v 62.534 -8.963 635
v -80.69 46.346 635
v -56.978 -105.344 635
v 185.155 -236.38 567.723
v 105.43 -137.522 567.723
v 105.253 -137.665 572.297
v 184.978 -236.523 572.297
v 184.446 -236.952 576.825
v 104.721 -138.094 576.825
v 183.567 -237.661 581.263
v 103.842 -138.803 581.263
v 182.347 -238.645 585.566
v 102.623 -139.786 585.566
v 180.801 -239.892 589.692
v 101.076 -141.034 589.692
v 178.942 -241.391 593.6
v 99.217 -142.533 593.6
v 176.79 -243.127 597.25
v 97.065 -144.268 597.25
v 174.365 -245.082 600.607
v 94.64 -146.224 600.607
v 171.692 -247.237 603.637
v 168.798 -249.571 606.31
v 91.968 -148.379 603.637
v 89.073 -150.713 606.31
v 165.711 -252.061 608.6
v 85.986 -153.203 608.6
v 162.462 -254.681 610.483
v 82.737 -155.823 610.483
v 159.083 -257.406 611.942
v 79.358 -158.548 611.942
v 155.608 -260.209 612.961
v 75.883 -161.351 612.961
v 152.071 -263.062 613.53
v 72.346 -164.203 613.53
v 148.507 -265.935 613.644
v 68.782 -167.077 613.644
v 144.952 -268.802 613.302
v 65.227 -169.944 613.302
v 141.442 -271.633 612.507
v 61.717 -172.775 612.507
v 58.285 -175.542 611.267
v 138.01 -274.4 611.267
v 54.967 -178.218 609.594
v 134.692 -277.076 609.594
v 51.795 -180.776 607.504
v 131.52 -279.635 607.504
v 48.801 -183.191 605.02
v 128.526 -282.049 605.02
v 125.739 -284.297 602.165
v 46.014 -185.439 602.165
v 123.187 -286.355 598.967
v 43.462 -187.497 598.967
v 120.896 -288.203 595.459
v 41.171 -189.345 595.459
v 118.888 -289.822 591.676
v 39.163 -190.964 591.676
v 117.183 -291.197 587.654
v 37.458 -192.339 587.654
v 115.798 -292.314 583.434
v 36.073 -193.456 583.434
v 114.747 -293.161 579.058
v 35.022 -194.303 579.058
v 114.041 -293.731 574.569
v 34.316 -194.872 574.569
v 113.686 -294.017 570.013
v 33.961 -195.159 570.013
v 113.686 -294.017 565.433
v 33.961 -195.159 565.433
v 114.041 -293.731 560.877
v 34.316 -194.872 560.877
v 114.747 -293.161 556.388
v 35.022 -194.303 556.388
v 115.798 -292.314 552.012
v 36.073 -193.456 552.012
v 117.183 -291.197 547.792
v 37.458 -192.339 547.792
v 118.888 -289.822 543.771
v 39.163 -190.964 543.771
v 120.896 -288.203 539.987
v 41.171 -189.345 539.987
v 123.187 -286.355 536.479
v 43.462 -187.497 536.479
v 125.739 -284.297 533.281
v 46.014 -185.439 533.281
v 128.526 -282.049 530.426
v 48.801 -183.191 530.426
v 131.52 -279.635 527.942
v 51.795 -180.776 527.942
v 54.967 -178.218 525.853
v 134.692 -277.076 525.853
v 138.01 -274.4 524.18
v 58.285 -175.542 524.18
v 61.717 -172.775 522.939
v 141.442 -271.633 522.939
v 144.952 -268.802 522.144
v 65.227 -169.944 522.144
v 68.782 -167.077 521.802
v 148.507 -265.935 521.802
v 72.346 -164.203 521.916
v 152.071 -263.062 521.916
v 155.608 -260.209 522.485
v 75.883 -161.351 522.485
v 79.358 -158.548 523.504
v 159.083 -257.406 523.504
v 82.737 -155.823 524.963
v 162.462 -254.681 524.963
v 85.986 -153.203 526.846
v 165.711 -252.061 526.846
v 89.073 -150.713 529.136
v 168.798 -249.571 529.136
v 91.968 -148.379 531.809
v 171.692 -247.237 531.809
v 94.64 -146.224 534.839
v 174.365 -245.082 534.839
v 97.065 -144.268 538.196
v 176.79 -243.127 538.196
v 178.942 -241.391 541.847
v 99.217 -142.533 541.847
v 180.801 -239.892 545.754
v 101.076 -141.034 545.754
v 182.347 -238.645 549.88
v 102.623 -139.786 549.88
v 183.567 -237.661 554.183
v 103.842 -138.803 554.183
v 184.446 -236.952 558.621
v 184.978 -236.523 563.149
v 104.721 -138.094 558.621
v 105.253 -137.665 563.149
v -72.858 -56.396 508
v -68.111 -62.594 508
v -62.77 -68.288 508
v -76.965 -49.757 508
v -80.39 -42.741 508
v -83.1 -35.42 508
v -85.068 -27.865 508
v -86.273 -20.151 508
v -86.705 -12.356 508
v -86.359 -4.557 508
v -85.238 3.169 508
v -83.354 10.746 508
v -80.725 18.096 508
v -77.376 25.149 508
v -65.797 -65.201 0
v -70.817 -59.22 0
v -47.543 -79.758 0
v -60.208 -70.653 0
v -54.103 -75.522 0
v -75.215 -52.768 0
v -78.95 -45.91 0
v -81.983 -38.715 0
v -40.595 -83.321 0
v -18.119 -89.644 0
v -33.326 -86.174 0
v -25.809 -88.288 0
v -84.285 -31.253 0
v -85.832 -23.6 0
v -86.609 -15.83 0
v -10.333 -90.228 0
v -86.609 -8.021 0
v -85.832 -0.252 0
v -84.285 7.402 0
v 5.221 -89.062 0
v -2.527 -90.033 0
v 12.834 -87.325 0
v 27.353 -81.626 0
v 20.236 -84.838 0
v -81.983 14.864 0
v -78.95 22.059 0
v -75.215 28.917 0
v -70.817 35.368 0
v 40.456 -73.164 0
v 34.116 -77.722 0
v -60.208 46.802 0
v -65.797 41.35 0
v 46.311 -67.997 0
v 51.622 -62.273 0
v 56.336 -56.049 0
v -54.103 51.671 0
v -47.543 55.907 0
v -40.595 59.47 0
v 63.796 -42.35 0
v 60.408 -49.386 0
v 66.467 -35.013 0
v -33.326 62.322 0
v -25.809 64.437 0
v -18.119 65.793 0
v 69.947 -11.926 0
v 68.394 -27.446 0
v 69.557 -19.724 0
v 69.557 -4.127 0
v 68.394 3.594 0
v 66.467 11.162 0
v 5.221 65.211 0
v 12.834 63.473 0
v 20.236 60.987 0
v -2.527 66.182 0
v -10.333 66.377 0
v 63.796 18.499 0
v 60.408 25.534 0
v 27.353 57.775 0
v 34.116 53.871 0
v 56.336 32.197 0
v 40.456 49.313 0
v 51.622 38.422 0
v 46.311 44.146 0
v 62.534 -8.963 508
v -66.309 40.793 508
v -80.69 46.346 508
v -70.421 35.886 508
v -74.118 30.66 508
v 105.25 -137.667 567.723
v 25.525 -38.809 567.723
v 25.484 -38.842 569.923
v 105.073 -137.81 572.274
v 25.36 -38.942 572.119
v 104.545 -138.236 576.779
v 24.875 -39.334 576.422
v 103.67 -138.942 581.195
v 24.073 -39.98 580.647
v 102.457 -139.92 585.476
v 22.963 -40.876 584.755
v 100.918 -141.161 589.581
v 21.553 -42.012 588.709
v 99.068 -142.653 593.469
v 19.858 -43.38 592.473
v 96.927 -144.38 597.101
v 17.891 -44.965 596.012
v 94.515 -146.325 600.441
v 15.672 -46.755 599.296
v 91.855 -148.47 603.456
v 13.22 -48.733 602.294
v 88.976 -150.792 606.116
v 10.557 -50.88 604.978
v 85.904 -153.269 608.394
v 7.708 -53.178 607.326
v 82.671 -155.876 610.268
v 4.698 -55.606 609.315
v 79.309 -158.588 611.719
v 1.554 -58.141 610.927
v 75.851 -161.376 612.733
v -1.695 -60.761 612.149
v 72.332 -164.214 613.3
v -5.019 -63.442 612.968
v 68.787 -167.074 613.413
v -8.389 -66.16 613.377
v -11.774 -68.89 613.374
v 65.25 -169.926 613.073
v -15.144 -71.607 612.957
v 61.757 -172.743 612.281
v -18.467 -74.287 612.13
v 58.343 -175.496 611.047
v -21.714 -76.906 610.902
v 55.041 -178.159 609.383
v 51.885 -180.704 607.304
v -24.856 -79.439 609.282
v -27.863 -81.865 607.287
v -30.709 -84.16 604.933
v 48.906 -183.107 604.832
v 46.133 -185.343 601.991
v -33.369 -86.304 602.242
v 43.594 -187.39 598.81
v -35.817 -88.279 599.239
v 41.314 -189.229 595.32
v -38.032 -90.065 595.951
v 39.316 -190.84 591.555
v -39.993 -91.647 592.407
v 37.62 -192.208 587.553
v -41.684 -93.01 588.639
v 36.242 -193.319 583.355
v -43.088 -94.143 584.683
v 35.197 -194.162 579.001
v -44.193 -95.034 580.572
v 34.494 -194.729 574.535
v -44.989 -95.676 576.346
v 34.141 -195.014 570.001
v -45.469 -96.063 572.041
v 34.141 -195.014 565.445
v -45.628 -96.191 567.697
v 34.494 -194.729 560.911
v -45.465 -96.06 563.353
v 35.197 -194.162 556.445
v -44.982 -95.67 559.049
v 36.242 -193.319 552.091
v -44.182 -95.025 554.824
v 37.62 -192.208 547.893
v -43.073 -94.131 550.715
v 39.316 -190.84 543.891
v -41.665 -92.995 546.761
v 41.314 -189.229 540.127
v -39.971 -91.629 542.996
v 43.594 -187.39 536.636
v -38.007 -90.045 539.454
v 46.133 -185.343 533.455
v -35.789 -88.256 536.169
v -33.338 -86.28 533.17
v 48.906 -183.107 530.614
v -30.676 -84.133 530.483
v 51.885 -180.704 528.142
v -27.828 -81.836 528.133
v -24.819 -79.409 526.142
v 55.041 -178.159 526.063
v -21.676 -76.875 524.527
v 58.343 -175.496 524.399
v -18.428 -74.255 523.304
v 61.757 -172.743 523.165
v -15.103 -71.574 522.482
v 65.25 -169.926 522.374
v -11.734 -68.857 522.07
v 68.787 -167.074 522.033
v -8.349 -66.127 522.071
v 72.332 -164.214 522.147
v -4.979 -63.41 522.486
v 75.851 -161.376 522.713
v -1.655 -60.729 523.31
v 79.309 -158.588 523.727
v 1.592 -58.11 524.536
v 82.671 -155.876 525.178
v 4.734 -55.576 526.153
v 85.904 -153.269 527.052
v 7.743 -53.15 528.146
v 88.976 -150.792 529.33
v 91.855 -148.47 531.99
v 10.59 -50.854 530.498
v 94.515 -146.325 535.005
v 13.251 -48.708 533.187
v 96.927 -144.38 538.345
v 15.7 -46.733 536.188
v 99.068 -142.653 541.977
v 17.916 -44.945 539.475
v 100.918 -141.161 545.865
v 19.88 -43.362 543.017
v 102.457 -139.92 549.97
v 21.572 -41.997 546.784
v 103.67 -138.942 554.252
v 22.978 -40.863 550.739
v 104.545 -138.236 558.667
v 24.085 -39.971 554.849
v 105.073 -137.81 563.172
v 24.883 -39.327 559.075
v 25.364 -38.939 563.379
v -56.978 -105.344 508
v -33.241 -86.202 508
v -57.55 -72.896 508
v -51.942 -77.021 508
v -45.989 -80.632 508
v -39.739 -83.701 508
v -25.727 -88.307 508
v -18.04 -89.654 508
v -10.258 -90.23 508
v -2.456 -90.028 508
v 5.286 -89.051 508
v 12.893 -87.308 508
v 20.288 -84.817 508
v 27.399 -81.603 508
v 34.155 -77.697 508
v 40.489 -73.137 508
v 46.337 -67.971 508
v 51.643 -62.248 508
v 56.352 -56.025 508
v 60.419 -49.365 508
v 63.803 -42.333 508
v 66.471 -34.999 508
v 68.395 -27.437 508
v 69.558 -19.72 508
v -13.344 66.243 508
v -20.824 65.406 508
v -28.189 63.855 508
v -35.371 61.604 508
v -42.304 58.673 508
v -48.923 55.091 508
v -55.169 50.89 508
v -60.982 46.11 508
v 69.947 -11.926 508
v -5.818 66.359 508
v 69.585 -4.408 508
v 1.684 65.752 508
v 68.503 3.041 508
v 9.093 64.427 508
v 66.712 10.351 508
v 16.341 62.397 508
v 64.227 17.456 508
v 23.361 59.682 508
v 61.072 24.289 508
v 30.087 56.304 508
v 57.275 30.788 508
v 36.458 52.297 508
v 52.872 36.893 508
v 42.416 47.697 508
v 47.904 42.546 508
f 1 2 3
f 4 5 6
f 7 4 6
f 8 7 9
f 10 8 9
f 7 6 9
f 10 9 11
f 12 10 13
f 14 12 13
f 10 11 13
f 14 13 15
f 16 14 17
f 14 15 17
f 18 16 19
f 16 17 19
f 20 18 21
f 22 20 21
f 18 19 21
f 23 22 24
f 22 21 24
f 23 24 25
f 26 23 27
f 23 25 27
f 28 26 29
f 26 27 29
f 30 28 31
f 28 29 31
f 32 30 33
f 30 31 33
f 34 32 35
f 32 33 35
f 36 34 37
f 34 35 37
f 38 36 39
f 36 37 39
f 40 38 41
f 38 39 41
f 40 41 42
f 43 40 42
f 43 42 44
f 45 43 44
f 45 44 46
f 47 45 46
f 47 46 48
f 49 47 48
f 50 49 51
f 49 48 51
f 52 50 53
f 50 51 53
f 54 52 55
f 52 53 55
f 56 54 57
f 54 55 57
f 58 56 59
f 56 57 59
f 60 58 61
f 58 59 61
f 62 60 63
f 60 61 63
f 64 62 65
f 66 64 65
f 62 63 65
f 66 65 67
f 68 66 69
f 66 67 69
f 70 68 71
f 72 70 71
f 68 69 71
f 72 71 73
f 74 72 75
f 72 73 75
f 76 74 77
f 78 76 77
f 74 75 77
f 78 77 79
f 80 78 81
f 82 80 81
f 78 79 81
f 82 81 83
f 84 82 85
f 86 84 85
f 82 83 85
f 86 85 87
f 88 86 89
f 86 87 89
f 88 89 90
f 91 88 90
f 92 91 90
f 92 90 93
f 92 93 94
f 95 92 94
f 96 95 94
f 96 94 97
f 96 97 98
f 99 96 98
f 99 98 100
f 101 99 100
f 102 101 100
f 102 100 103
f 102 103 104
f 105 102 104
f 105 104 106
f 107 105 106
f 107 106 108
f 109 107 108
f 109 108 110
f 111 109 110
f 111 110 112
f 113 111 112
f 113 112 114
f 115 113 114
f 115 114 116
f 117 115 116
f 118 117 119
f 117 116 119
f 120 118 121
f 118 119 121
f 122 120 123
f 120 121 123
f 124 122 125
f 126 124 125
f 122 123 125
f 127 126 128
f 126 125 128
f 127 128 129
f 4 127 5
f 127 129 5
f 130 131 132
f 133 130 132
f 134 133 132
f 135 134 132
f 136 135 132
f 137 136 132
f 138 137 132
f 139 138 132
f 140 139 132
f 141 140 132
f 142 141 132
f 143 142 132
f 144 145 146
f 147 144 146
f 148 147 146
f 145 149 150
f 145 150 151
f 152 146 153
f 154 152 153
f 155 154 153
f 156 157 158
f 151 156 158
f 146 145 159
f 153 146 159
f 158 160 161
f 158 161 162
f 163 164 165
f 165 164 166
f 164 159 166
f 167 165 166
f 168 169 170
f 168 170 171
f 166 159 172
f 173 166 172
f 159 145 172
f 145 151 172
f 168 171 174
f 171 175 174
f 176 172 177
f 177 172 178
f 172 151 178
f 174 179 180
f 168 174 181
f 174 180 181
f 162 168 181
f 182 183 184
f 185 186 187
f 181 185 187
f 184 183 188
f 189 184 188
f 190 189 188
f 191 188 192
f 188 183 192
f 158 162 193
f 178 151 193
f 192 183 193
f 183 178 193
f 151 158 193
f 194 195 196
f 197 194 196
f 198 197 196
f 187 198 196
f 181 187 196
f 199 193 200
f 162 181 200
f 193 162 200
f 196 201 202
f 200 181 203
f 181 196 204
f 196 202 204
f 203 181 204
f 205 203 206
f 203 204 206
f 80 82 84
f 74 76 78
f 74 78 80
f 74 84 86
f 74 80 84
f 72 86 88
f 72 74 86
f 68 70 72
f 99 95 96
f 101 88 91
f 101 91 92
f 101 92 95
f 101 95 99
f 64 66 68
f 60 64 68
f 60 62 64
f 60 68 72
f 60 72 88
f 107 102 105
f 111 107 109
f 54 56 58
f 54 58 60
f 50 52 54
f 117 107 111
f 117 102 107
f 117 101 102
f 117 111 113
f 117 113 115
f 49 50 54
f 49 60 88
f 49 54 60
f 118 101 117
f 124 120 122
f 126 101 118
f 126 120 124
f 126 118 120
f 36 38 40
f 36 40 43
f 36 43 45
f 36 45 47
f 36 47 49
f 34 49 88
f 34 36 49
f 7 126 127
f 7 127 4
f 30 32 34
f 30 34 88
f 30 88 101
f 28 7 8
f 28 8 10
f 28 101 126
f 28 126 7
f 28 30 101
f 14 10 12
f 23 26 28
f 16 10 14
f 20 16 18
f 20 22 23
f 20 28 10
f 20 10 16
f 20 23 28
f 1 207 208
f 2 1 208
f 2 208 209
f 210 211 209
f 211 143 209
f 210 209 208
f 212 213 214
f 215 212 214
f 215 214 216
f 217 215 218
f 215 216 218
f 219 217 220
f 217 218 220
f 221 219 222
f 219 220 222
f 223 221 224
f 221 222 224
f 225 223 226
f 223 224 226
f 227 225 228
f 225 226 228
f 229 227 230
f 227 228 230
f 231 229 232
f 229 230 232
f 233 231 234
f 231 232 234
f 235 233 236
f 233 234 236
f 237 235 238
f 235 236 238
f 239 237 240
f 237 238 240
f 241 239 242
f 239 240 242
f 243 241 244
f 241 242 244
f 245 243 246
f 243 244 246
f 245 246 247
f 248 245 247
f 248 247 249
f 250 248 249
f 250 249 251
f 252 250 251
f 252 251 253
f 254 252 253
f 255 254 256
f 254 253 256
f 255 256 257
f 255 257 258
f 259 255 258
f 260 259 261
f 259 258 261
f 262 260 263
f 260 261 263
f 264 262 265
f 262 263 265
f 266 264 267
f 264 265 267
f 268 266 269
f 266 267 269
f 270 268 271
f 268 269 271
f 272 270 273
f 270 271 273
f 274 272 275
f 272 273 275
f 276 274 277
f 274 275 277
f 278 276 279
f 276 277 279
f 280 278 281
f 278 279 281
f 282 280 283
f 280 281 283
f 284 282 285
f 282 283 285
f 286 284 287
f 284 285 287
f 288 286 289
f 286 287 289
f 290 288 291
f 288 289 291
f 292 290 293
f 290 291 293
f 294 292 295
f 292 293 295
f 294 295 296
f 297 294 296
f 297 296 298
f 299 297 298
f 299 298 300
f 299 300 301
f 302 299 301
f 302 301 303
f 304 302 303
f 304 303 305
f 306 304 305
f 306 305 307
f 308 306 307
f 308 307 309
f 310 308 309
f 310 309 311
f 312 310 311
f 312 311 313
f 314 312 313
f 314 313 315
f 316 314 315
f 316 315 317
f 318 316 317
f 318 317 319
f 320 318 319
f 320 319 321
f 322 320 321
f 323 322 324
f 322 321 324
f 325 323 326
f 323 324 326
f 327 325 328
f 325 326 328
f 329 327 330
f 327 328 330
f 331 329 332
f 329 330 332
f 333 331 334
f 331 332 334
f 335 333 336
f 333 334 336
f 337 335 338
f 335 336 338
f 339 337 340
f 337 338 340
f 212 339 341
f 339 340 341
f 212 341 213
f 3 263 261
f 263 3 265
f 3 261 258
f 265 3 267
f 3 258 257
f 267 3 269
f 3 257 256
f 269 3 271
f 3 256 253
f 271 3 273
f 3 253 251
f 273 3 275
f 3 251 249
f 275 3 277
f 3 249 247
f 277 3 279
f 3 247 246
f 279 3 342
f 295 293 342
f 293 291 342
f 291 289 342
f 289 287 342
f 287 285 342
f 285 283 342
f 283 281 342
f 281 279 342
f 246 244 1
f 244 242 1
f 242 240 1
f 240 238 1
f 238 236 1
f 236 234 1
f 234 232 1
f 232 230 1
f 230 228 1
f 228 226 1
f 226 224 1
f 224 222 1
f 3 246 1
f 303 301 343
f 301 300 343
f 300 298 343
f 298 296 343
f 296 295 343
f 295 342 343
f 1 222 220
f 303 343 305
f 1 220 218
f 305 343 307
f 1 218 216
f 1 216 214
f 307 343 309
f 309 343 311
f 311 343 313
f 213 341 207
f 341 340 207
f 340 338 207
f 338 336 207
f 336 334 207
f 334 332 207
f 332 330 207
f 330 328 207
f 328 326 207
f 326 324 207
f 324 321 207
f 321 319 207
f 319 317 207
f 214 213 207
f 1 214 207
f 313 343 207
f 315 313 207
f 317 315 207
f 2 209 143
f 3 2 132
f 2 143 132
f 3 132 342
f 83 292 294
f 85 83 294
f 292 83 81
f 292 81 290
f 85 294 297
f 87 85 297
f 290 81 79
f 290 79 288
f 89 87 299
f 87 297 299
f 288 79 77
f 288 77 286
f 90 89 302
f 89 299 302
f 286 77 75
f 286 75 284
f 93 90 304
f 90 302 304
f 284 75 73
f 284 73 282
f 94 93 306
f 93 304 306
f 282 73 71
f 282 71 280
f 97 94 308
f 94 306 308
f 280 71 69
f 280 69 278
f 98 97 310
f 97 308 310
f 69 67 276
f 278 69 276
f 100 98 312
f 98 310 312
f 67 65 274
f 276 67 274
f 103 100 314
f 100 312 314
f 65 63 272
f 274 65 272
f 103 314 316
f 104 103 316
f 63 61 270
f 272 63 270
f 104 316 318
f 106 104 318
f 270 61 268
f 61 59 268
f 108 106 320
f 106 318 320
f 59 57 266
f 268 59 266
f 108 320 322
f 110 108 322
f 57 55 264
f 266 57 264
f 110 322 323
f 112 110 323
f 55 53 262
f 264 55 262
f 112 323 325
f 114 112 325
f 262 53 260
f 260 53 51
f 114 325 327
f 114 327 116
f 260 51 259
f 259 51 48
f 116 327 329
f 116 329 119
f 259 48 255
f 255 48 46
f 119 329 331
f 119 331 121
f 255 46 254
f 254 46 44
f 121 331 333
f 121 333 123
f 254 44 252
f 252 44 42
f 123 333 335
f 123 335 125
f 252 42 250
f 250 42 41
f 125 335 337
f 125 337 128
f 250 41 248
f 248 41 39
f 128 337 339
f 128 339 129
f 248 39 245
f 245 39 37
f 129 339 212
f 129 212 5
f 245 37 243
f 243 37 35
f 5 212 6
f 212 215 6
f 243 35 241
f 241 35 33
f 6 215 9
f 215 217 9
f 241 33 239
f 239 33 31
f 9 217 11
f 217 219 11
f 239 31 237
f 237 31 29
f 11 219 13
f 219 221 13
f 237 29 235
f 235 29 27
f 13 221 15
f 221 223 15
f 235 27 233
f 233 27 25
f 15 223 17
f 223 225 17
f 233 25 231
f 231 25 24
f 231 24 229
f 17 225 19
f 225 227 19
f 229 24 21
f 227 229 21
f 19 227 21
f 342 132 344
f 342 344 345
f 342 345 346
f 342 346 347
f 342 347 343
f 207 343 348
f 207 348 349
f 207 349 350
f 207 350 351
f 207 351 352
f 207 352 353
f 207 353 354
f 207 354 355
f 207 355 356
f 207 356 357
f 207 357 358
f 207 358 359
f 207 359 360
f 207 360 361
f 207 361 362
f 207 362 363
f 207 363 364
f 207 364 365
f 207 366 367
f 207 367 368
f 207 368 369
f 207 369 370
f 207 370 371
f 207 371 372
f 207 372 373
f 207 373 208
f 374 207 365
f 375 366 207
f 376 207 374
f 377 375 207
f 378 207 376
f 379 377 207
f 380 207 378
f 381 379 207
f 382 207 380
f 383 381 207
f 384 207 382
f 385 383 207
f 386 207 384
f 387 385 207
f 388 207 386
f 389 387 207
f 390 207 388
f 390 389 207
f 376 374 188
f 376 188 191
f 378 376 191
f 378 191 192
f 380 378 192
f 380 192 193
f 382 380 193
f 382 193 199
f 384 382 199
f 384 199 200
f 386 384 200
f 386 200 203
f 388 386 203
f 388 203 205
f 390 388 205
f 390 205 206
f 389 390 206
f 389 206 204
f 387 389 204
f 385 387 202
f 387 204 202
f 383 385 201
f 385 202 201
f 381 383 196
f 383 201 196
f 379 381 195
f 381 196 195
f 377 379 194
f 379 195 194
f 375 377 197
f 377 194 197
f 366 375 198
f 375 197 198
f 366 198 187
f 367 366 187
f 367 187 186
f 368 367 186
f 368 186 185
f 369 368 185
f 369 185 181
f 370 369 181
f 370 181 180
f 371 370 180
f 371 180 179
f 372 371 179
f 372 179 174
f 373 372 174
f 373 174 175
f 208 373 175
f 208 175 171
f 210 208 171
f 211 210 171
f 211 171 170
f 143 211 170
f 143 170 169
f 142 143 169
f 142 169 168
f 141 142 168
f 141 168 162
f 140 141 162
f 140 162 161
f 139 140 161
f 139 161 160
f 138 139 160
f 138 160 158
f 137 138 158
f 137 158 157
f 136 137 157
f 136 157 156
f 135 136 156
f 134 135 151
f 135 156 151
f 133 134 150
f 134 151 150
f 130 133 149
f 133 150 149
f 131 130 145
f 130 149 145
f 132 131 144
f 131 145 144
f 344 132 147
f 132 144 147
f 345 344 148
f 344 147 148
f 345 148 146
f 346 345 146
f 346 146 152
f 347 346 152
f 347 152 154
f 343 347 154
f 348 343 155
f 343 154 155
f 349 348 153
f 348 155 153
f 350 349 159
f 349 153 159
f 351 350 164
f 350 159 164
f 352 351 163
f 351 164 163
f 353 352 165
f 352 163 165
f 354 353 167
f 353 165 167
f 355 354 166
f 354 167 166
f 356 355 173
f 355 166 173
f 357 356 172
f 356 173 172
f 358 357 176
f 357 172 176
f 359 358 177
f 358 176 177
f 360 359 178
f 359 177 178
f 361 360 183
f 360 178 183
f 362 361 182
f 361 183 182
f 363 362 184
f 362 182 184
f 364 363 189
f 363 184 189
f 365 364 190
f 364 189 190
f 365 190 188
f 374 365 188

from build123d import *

# Parameters (mm, degrees)
F0_R     = 78.326584
F1_DEPTH = 508
F3_DEPTH = 127
F4_R     = 45.704284
F5_DEPTH = 127
F6_R     = 45.93558
F7_DEPTH = 127


with BuildPart() as f1:
    # F0 (on Top) → F1 (new body)
    with BuildSketch(Plane.XY):
        with Locations((-8.379999, -11.925638)):
            Circle(F0_R)
    extrude(amount=F1_DEPTH)

    # F2 (on face) → F3 (join)
    with BuildSketch(Plane.XY.offset(508)):
        Polygon((-56.977515, -105.344039), (62.533833, -8.963253), (-80.69005, 46.346217), align=None)
    extrude(amount=F3_DEPTH)

    # F4 (on face) → F5 (join)
    with BuildSketch(Plane(origin=(29.023017, -35.988292, 0), x_dir=(0.778411, 0.627755, 0), z_dir=(0.627755, -0.778411, 0))):
        with Locations((-50.197605, 567.723095)):
            Circle(F4_R)
    extrude(amount=F5_DEPTH)

    # F6 (on face) → F7 (join)
    with BuildSketch(Plane(origin=(108.747912, -134.846479, 0), x_dir=(0.778411, 0.627755, 0), z_dir=(0.627755, -0.778411, 0))):
        with Locations((-50.197605, 567.723095)):
            Circle(F6_R)
    extrude(amount=F7_DEPTH)


solid = f1.part
